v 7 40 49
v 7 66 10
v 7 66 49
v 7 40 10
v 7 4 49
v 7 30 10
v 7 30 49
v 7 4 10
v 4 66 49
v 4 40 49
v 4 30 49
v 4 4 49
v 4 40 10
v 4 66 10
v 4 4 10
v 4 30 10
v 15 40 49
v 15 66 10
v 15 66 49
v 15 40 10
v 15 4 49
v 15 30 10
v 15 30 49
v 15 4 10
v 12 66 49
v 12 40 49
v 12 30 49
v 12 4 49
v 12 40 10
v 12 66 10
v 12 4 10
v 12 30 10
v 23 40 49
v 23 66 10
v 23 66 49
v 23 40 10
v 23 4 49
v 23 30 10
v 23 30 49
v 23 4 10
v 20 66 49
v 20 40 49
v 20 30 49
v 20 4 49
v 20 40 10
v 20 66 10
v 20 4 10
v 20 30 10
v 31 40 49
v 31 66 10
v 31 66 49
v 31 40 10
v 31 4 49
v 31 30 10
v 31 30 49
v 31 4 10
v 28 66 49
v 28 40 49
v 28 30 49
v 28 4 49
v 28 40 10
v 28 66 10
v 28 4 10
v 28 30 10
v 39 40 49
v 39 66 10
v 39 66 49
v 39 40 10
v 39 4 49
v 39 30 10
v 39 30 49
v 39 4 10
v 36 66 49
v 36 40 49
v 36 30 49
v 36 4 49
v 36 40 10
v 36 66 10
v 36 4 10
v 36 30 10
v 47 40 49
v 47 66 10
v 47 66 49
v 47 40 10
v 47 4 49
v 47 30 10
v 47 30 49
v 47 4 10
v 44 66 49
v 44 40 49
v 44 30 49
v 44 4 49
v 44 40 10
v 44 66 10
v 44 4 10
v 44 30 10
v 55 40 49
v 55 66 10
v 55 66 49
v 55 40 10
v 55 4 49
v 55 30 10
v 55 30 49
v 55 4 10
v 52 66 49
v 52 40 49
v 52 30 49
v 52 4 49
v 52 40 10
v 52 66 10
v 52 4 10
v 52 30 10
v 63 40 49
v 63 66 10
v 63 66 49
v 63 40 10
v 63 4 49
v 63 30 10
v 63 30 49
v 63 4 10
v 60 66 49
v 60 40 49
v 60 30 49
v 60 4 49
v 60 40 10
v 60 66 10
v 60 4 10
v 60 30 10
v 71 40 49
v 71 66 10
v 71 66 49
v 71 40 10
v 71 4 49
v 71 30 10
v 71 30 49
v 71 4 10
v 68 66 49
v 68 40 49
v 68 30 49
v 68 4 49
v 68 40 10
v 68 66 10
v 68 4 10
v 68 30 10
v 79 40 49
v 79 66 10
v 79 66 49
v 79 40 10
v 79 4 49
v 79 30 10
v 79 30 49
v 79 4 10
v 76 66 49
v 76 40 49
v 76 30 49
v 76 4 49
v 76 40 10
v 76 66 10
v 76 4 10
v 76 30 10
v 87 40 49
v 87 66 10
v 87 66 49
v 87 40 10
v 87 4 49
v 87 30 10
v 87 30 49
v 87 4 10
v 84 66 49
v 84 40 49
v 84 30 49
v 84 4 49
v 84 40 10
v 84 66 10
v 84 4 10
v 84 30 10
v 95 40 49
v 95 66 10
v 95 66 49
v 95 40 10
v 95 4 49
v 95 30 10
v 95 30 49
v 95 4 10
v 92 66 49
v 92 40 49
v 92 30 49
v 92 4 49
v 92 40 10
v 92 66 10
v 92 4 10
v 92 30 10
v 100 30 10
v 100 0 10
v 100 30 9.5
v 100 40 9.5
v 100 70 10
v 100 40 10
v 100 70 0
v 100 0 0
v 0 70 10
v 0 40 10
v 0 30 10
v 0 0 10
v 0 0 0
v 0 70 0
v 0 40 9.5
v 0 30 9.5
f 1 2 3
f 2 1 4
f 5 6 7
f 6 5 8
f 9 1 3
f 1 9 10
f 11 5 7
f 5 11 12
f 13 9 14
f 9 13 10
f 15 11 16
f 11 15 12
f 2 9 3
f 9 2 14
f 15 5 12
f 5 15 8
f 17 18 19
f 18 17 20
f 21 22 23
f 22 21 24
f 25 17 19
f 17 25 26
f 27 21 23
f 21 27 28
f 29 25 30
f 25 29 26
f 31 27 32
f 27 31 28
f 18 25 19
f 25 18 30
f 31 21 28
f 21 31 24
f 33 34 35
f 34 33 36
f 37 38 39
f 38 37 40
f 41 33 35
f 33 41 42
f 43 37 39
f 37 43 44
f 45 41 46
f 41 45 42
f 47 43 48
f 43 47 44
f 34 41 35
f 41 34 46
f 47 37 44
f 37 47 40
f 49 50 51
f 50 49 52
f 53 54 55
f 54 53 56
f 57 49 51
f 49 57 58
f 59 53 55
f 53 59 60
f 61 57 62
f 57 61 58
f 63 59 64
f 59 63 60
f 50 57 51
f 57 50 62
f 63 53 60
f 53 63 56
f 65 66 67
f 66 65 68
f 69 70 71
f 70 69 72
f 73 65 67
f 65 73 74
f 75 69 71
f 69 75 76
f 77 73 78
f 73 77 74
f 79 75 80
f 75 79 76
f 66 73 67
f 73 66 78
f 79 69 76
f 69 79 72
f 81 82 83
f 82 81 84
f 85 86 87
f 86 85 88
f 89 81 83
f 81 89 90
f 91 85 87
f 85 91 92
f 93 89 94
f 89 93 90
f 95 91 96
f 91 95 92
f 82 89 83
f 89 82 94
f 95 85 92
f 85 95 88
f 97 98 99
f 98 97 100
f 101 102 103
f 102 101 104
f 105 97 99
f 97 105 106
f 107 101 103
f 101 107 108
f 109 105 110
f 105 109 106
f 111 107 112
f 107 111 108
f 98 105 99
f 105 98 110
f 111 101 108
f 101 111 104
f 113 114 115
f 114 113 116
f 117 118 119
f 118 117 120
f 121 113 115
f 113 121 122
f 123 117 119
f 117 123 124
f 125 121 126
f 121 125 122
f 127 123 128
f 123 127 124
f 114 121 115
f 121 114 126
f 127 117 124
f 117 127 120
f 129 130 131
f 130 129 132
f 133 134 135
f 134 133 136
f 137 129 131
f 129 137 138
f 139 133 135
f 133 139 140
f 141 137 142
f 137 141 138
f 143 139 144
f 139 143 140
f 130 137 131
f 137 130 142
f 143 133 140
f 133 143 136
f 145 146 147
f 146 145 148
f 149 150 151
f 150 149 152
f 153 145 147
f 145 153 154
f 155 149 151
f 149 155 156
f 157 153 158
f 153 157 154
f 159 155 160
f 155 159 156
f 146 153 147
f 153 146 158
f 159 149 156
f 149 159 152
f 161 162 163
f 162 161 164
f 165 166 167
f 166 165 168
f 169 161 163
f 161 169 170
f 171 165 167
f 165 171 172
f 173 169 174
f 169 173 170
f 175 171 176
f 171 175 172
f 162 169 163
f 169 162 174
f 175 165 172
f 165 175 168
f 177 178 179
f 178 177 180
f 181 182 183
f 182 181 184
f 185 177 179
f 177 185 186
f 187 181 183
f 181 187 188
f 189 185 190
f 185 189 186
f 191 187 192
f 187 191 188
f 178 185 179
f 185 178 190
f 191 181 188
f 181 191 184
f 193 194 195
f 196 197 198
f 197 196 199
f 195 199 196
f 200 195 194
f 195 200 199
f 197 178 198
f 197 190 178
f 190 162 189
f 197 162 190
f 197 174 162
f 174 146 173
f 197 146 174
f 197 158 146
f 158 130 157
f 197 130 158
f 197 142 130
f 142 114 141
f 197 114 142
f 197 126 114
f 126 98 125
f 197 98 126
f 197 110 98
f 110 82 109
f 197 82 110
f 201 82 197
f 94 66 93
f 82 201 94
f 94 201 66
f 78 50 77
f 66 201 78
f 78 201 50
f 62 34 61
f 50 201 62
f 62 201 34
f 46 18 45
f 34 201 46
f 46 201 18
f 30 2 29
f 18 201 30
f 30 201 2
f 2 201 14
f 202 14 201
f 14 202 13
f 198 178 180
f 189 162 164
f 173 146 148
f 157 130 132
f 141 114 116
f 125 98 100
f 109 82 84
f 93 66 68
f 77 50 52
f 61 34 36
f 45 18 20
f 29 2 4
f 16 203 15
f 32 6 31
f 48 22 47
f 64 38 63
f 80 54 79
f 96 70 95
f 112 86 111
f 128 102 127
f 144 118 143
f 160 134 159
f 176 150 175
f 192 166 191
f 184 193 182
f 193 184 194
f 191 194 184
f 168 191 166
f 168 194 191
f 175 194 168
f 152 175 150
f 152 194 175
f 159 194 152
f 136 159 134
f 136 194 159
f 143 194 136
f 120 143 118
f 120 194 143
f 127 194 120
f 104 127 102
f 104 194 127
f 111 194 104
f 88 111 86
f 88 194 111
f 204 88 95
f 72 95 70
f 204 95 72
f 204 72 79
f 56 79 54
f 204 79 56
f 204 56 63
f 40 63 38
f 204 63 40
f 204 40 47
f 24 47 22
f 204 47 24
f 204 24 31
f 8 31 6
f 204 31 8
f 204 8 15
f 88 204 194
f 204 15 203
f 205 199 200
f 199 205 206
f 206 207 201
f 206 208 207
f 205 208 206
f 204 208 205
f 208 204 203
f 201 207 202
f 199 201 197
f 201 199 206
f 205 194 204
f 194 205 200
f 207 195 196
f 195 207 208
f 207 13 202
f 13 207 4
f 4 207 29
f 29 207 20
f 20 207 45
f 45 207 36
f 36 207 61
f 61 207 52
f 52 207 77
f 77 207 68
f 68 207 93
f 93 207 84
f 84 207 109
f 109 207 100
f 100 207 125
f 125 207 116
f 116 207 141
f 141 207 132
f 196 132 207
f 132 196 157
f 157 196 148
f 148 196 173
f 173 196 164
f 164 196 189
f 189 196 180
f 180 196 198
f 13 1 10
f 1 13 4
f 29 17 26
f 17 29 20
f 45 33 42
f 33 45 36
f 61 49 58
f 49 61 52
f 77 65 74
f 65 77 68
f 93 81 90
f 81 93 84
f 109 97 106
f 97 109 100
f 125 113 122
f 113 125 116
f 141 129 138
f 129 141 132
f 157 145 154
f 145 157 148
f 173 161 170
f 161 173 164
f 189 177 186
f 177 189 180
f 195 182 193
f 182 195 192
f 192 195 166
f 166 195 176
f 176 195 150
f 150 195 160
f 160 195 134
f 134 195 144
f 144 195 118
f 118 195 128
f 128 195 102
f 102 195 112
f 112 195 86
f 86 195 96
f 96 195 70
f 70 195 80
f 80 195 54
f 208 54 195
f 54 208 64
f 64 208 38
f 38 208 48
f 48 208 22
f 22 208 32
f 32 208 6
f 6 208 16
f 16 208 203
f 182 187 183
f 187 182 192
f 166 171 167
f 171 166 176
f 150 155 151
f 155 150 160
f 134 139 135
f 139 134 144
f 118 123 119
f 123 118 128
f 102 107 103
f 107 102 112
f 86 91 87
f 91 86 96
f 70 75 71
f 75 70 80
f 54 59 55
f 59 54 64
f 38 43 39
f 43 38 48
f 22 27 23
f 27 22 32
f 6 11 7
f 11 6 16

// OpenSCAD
$fn = 32;

// ----------------------------------------------------------------------
// Heatsink: slotted fin block
// ----------------------------------------------------------------------

// --- parameters (mm) ---
base_l = 100;             // base length, X
base_w = 70;              // base width, Y
base_t = 10;              // base plate thickness
fin_h = 40;               // fin height above the base
fin_t = 3;                // fin thickness
edge = 4;                 // margin from the base ends
pitch = 8;                // fin pitch
slot_w = 10;              // central slot width, Y
fit_tol = 0.05;           // tolerance for press fits, mm
free_tol = 0.3;           // tolerance for clearance fits, mm

n_fins = floor((base_l - 2 * edge - fin_t) / pitch) + 1;  // fin count
total_h = base_t + fin_h - 1;  // overall height

difference() {
union() {
  cube([base_l, base_w, base_t]);
  for (i = [0 : n_fins - 1])
    translate([edge + i * pitch, edge, base_t - 1])
      cube([fin_t, base_w - 2 * edge, fin_h]);
}
  translate([-1, base_w / 2 - slot_w / 2, base_t - 0.5])
    cube([base_l + 2, slot_w, fin_h + 2]);
}
